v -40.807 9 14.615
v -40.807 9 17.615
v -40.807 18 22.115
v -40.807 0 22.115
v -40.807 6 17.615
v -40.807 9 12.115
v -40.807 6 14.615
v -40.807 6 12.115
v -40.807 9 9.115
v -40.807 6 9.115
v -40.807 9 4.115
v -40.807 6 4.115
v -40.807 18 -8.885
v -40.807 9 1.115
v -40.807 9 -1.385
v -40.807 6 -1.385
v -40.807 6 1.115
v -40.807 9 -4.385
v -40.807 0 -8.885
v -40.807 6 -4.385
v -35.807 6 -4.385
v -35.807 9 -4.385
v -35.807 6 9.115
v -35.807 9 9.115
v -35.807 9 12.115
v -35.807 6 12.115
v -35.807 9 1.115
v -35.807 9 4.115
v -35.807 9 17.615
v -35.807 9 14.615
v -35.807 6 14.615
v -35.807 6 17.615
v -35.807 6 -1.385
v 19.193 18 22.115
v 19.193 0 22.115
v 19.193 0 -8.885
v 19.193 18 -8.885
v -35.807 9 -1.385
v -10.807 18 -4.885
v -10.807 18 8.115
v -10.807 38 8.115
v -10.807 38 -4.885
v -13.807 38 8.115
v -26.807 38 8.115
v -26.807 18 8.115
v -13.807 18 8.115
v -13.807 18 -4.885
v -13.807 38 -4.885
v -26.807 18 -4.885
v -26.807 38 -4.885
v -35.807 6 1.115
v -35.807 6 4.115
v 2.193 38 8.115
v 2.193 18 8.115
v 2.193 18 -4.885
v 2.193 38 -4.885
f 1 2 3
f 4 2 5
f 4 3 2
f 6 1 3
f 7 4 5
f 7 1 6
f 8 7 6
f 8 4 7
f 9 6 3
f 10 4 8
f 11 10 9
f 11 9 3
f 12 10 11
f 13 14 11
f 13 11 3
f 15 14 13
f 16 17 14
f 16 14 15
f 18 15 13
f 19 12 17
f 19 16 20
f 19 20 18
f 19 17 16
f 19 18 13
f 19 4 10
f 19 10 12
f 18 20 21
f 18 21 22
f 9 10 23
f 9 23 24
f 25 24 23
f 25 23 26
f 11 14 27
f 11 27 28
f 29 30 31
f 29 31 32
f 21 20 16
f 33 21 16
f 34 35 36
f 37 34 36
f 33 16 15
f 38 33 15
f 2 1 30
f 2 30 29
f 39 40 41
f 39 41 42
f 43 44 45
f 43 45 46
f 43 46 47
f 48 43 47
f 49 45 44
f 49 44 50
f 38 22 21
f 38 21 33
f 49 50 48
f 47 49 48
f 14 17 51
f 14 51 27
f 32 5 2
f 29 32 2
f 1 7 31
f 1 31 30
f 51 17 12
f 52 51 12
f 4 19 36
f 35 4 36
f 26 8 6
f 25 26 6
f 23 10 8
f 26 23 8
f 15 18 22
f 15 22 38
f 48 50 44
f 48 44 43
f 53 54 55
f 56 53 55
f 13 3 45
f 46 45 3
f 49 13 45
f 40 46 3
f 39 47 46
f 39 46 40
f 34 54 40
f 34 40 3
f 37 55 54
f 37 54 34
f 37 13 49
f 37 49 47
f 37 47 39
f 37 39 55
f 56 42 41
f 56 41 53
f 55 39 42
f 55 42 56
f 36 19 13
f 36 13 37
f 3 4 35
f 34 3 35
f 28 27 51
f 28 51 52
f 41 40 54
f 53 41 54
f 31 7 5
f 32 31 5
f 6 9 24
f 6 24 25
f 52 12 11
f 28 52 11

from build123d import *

# Parameters (mm, degrees)
SCHIZZO1_W                   = 60
SCHIZZO1_H                   = 31
ESTRUSIONE_ESTRUSIONE1_DEPTH = 18
SCHIZZO2_W                   = 13
SCHIZZO2_H                   = 13
ESTRUSIONE_ESTRUSIONE2_DEPTH = 20
SCHIZZO3_W                   = 3
SCHIZZO3_H                   = 3
TAGLIO_ESTRUSIONE1_DEPTH     = 5


with BuildPart() as part:
    # Schizzo1 → Estrusione-Estrusione1 (new body)
    with BuildSketch(Plane(origin=(0, 0, 0), x_dir=(1, 0, 0), z_dir=(0, 1, 0))):
        with Locations((-10.807034353, -6.614779908)):
            Rectangle(SCHIZZO1_W, SCHIZZO1_H)
    extrude(amount=ESTRUSIONE_ESTRUSIONE1_DEPTH)

    # Schizzo2 → Estrusione-Estrusione2 (add)
    with BuildSketch(Plane(origin=(0, 18, 0), x_dir=(1, 0, 0), z_dir=(0, 1, 0))):
        with Locations((-20.307034353, -1.614779908)):
            Rectangle(SCHIZZO2_W, SCHIZZO2_H)
        with Locations((-4.307034353, -1.614779908)):
            Rectangle(SCHIZZO2_W, SCHIZZO2_H)
    extrude(amount=ESTRUSIONE_ESTRUSIONE2_DEPTH)

    # Schizzo3 → Taglio-Estrusione1 (cut)
    with BuildSketch(Plane.ZY.offset(40.807034353)):
        with Locations((-2.885220092, 7.5)):
            Rectangle(SCHIZZO3_W, SCHIZZO3_H)
        with Locations((2.614779908, 7.5)):
            Rectangle(SCHIZZO3_W, SCHIZZO3_H)
        with Locations((10.614779908, 7.5)):
            Rectangle(SCHIZZO3_W, SCHIZZO3_H)
        with Locations((16.114779908, 7.5)):
            Rectangle(SCHIZZO3_W, SCHIZZO3_H)
    extrude(amount=-TAGLIO_ESTRUSIONE1_DEPTH, mode=Mode.SUBTRACT)


solid = part.part
